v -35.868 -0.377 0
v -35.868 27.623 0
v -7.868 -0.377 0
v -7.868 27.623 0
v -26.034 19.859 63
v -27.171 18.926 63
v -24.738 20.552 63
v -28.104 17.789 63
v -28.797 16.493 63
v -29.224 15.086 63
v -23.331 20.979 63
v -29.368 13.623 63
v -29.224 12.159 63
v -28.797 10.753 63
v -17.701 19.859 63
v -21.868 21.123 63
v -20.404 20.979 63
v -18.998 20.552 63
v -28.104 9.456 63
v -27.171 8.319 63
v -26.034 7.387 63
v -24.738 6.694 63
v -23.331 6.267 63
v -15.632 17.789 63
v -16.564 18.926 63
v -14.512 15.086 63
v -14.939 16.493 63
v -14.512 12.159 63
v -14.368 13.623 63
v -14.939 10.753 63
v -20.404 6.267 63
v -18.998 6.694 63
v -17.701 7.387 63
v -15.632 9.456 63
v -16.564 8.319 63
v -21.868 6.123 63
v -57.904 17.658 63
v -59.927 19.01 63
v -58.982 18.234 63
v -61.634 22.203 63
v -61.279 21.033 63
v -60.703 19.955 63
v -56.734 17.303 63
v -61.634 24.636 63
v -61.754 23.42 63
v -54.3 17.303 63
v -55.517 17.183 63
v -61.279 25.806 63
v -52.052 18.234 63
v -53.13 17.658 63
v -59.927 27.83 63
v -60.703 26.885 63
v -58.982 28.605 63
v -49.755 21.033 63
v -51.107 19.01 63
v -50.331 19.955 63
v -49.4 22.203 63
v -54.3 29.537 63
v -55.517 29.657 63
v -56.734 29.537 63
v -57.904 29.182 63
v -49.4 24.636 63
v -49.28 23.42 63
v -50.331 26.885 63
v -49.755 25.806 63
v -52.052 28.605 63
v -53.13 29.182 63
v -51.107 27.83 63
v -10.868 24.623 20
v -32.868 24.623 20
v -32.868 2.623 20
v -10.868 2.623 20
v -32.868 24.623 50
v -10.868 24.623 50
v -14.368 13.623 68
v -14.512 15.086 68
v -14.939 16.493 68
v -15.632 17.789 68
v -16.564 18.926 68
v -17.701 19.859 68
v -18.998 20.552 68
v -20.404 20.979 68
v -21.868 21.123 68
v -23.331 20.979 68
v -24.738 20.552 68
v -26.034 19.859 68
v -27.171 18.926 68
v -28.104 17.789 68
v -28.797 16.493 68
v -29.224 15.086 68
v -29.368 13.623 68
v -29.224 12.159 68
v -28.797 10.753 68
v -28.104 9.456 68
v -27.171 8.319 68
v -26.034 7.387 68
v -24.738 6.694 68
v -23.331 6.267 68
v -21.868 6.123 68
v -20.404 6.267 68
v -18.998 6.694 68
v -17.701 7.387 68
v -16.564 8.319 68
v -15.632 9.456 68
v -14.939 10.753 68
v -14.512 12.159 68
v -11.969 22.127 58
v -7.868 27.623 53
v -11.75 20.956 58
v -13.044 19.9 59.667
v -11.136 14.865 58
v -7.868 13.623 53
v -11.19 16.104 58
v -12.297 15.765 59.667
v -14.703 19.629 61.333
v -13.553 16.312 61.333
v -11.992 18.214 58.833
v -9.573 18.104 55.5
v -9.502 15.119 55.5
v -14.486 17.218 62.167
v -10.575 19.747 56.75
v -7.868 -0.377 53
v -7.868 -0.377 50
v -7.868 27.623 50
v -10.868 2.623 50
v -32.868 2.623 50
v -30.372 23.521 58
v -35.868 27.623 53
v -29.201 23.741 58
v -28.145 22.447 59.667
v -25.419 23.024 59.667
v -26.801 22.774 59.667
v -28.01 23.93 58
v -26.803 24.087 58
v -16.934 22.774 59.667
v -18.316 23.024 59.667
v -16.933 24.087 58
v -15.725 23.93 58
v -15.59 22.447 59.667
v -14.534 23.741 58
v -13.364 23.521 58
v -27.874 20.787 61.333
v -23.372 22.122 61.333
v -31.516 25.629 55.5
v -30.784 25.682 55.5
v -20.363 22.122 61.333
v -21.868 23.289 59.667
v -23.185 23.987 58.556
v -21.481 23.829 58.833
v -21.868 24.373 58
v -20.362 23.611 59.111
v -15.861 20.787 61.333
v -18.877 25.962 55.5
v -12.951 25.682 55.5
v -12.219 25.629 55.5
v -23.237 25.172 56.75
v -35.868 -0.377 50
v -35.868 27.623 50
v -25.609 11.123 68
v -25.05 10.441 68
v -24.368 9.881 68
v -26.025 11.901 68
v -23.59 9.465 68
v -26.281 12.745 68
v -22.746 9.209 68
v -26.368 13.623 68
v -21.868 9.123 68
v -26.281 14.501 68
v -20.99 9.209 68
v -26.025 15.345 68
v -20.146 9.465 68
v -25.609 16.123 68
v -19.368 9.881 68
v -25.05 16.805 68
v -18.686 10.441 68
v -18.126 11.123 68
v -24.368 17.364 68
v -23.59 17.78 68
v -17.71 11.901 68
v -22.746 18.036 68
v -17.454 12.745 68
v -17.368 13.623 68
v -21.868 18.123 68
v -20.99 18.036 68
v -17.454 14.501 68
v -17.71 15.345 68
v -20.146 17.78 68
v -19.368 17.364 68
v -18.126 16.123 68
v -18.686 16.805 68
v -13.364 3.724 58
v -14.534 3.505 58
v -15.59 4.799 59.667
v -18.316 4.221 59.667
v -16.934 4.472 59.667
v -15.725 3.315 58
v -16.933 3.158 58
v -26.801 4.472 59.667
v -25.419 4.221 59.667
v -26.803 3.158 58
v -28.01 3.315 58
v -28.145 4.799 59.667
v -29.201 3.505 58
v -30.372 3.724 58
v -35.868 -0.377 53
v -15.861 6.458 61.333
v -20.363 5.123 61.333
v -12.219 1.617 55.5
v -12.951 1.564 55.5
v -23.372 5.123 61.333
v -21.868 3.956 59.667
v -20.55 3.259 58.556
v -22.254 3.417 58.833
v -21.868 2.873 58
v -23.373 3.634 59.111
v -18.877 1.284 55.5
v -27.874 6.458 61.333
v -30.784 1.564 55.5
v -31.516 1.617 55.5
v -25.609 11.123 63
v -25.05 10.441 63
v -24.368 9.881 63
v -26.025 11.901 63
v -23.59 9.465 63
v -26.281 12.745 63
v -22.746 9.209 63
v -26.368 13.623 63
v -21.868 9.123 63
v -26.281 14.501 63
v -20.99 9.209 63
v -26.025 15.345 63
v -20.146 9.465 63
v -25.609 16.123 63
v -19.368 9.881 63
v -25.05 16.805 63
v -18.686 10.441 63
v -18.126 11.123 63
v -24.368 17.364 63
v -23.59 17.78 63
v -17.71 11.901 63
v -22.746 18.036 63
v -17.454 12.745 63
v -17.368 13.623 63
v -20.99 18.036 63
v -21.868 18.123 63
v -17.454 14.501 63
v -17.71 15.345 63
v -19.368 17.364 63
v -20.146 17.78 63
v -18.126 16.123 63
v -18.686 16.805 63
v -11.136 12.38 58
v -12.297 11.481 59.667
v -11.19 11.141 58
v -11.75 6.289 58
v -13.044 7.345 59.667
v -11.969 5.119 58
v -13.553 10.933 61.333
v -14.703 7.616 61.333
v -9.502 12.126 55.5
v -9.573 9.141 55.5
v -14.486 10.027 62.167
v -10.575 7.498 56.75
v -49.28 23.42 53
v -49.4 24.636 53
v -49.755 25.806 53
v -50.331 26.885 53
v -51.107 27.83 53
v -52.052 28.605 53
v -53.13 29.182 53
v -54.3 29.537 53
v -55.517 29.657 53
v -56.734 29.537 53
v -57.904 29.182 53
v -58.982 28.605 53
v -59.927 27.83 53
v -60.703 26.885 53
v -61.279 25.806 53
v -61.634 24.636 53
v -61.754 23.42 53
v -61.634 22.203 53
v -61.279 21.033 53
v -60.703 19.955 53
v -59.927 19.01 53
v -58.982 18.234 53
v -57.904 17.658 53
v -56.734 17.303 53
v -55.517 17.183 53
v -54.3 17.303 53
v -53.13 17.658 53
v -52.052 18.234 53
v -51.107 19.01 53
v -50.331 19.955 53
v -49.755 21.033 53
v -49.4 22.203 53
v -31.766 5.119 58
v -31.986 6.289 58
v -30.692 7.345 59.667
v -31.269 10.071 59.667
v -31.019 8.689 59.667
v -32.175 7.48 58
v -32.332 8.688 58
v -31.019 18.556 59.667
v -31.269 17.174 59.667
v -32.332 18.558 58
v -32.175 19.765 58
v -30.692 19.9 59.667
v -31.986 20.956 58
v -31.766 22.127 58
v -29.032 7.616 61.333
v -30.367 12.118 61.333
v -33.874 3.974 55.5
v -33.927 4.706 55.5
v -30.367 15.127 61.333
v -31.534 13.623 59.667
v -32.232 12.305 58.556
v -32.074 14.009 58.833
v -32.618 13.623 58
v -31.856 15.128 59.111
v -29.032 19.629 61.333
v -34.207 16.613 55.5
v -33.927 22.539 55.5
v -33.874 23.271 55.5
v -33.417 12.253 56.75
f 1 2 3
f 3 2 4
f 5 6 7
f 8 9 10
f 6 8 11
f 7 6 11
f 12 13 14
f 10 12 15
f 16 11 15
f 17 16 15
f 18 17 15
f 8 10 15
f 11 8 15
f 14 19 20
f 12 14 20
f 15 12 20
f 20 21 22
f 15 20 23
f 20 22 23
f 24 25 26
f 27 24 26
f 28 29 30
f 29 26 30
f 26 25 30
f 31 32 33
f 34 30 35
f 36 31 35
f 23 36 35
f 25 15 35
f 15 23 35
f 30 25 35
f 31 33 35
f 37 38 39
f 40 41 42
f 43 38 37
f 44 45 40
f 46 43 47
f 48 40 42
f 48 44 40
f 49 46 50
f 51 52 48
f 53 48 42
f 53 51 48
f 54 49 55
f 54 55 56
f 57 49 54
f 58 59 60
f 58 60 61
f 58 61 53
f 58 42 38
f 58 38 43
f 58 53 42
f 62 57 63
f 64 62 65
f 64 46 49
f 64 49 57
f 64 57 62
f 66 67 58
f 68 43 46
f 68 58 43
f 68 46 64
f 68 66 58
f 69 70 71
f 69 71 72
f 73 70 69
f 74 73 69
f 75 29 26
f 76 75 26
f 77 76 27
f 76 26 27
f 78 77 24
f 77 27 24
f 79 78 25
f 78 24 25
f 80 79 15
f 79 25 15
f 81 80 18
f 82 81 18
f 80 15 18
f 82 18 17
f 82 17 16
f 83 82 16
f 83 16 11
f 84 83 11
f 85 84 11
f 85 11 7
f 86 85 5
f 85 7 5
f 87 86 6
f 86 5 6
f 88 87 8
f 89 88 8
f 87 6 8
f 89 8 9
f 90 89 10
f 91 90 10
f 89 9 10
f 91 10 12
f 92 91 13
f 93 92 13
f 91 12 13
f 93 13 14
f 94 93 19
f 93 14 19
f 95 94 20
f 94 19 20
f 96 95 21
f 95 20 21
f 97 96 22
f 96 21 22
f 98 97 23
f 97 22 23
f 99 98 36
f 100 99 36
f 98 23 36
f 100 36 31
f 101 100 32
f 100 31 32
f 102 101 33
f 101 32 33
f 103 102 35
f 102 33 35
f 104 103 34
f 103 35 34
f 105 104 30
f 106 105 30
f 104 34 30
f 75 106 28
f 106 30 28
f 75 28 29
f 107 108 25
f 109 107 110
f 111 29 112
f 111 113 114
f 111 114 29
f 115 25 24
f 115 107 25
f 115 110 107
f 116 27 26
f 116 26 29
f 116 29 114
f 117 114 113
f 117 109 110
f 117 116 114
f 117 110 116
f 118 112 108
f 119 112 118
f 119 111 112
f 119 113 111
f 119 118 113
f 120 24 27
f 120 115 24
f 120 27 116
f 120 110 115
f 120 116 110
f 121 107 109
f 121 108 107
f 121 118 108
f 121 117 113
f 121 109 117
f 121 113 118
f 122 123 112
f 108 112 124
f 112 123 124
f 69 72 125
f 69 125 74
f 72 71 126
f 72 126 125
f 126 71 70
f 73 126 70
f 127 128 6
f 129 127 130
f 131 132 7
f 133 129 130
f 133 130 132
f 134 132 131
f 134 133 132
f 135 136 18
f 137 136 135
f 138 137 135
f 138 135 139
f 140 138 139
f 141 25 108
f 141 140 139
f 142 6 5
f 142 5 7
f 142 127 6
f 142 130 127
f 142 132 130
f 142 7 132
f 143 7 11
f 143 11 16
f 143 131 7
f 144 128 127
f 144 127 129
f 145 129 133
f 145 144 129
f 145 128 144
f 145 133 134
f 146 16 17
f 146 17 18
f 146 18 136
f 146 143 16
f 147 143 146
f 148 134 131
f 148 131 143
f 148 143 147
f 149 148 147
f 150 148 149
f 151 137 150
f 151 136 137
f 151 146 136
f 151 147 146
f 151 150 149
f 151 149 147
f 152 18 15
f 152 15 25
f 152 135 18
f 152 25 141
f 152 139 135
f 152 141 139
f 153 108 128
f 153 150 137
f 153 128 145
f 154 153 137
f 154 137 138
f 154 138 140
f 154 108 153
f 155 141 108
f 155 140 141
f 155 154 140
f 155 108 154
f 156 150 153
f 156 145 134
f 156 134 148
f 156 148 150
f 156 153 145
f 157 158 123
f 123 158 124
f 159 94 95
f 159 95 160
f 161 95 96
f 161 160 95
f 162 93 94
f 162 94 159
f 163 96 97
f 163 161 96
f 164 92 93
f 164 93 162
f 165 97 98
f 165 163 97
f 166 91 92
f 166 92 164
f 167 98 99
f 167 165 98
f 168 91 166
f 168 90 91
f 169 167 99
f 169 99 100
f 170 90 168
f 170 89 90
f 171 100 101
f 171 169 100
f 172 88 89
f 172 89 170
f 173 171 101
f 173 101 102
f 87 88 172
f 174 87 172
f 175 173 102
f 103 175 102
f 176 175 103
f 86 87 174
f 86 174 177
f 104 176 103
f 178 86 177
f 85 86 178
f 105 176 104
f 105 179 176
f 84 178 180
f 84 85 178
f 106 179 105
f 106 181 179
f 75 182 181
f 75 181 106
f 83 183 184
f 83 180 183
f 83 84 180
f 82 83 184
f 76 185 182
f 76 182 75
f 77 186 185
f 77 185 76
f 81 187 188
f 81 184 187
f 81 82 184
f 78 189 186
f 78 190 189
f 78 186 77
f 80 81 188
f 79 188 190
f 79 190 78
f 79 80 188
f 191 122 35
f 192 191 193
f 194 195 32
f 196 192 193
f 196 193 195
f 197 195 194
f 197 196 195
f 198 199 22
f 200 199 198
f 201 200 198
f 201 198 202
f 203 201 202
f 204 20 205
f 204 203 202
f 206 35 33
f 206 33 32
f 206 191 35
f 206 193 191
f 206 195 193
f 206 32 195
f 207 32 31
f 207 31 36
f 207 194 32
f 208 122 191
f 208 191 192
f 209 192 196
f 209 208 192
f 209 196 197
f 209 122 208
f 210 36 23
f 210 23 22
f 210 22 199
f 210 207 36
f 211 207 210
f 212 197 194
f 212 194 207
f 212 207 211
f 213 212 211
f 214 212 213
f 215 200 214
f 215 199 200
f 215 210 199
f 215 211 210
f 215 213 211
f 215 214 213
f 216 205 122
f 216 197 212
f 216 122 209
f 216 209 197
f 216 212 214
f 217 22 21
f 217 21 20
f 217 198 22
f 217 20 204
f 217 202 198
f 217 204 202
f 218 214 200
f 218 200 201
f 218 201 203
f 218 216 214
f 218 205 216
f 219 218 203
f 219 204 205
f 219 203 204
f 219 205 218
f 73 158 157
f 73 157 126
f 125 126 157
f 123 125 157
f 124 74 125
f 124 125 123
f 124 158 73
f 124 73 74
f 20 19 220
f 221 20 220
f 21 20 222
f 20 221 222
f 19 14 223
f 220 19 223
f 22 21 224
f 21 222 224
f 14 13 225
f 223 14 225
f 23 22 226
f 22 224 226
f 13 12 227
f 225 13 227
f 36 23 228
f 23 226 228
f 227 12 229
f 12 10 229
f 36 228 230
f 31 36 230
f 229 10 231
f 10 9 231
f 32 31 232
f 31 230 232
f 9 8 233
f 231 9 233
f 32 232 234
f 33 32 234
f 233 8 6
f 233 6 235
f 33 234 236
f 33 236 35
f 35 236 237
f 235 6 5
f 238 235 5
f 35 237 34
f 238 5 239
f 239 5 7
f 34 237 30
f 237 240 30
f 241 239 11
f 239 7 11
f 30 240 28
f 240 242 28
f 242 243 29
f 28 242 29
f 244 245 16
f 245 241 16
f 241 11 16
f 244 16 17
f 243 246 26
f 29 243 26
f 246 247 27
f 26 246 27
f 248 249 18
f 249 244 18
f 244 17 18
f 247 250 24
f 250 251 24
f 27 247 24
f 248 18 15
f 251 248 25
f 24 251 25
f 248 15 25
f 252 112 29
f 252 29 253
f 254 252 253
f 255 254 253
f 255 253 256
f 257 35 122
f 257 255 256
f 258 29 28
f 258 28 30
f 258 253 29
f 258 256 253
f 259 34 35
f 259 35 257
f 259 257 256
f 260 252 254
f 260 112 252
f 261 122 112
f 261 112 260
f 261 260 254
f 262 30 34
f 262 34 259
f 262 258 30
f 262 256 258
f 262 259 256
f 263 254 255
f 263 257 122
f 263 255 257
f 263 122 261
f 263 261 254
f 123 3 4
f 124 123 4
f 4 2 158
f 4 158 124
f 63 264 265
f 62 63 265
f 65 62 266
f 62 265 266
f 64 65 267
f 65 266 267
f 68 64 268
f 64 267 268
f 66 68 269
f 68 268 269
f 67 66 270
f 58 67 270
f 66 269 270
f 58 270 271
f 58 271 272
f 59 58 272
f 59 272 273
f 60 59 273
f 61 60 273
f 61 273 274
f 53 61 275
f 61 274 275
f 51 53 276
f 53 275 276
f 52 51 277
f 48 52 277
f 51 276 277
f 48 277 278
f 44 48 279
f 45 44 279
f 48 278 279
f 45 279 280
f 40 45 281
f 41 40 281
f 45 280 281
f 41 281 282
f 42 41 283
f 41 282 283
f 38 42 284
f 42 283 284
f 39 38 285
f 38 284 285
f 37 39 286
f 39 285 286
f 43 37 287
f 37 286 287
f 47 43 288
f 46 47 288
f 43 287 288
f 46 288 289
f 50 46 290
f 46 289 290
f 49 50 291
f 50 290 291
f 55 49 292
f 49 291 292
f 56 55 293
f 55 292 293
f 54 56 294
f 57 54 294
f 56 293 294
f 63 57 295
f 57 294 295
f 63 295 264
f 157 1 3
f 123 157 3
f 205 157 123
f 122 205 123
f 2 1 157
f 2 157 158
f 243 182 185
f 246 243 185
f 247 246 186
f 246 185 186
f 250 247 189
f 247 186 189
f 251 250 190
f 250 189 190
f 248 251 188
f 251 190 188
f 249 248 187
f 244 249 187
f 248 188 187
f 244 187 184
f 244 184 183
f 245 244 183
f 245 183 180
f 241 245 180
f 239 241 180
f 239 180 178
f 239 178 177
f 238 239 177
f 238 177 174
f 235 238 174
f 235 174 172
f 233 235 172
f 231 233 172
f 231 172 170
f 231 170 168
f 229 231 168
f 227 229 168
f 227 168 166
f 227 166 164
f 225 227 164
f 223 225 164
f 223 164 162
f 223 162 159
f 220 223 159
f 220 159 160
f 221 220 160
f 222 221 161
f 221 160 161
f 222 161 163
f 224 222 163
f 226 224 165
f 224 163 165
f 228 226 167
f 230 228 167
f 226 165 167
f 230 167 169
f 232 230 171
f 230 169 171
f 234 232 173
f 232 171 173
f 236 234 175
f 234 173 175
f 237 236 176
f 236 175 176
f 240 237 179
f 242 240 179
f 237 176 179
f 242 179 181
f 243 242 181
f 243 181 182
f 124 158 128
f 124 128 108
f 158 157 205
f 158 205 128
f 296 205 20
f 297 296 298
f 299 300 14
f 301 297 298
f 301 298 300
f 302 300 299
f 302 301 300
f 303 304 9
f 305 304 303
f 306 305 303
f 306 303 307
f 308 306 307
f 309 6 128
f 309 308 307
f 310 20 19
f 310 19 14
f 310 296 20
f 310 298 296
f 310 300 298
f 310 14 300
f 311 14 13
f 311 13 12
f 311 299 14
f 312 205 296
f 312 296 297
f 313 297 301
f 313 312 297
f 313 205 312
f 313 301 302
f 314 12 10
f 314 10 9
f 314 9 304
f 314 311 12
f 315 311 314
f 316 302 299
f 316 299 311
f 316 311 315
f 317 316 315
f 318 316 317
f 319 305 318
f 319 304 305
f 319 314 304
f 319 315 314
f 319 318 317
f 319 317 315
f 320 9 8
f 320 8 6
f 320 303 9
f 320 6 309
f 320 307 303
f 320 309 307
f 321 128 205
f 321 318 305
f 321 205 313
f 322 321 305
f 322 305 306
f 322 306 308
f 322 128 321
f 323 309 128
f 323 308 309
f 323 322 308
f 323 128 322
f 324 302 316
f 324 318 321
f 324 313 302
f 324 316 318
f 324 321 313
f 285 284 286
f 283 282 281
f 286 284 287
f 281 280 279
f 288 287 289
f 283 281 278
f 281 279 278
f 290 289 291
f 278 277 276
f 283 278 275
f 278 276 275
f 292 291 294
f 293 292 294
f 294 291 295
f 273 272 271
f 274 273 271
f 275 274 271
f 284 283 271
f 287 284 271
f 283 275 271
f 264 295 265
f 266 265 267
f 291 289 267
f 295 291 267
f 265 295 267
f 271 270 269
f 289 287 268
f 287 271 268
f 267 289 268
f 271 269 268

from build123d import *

# Parameters (mm, degrees)
F0_W      = 28
F0_H      = 28
F0_W_2    = 22
F0_H_2    = 22
F1_DEPTH  = 50
F2_DEPTH  = 20
F3_W      = 28
F3_H      = 28
F3_W_2    = 22
F3_H_2    = 22
F4_DEPTH  = 3
F5_R      = 6.2368420166
F6_DEPTH  = 10
F7_R      = 7.5
F8_DEPTH  = 5
F8_FACE_R = 7.5
F4_FACE_W = 28
F4_FACE_H = 28
F10_R     = 4.5
F11_DEPTH = 200


with BuildPart() as f1:
    # F0 (on Top) → F1 (new body)
    with BuildSketch(Plane.XY):
        with Locations((-21.8676342088, 13.622631086)):
            Rectangle(F0_W, F0_H)
        with Locations((-21.8676342088, 13.622631086)):
            Rectangle(F0_W_2, F0_H_2, mode=Mode.SUBTRACT)
    extrude(amount=F1_DEPTH)

    # F0 (on Top) → F2 (join)
    with BuildSketch(Plane.XY):
        with Locations((-21.8676342088, 13.622631086)):
            Rectangle(F0_W_2, F0_H_2)
    extrude(amount=F2_DEPTH)


with BuildPart() as f4:
    # F3 (on face) → F4 (new body)
    with BuildSketch(Plane.XY.offset(50)):
        with Locations((-21.8676342088, 13.622631086)):
            Rectangle(F3_W, F3_H)
        with Locations((-21.8676342088, 13.622631086)):
            Rectangle(F3_W_2, F3_H_2, mode=Mode.SUBTRACT)
        with Locations((-21.8676342088, 13.622631086)):
            Rectangle(F3_W_2, F3_H_2)
    extrude(amount=F4_DEPTH)

    # F8_face (on face) → F9 section 0
    with BuildSketch(Plane(origin=(-21.8676342088, 13.622631086, 63), x_dir=(1, 0, 0), z_dir=(0, 0, -1))):
        Circle(F8_FACE_R)
    # F4_face (on face) → F9 section 1
    with BuildSketch(Plane(origin=(-21.8676342088, 13.622631086, 53), x_dir=(1, 0, 0), z_dir=(0, 0, 1))):
        Rectangle(F4_FACE_W, F4_FACE_H)
    loft()


with BuildPart() as f6:
    # F5 (on face) → F6 (new body)
    with BuildSketch(Plane.XY.offset(53)):
        with Locations((-55.5168837309, 23.41972664)):
            Circle(F5_R)
    extrude(amount=F6_DEPTH)


with BuildPart() as f8:
    # F7 (on face) → F8 (new body)
    with BuildSketch(Plane.XY.offset(63)):
        with Locations((-21.8676342088, 13.622631086)):
            Circle(F7_R)
    extrude(amount=F8_DEPTH)

    # F10 (on face) + F7 (on face) + F5 (on face) → F11 (cut)
    with BuildSketch(Plane.XY.offset(68)):
        with Locations((-21.8676342088, 13.622631086)):
            Circle(F10_R)
    with BuildSketch(Plane.XY.offset(63)):
        with Locations((-21.8676342088, 13.622631086)):
            Circle(F7_R)
    with BuildSketch(Plane.XY.offset(53)):
        with Locations((-55.5168837309, 23.41972664)):
            Circle(F5_R)
    extrude(amount=-F11_DEPTH, mode=Mode.SUBTRACT)


solid = Compound([f1.part, f4.part, f6.part, f8.part])
